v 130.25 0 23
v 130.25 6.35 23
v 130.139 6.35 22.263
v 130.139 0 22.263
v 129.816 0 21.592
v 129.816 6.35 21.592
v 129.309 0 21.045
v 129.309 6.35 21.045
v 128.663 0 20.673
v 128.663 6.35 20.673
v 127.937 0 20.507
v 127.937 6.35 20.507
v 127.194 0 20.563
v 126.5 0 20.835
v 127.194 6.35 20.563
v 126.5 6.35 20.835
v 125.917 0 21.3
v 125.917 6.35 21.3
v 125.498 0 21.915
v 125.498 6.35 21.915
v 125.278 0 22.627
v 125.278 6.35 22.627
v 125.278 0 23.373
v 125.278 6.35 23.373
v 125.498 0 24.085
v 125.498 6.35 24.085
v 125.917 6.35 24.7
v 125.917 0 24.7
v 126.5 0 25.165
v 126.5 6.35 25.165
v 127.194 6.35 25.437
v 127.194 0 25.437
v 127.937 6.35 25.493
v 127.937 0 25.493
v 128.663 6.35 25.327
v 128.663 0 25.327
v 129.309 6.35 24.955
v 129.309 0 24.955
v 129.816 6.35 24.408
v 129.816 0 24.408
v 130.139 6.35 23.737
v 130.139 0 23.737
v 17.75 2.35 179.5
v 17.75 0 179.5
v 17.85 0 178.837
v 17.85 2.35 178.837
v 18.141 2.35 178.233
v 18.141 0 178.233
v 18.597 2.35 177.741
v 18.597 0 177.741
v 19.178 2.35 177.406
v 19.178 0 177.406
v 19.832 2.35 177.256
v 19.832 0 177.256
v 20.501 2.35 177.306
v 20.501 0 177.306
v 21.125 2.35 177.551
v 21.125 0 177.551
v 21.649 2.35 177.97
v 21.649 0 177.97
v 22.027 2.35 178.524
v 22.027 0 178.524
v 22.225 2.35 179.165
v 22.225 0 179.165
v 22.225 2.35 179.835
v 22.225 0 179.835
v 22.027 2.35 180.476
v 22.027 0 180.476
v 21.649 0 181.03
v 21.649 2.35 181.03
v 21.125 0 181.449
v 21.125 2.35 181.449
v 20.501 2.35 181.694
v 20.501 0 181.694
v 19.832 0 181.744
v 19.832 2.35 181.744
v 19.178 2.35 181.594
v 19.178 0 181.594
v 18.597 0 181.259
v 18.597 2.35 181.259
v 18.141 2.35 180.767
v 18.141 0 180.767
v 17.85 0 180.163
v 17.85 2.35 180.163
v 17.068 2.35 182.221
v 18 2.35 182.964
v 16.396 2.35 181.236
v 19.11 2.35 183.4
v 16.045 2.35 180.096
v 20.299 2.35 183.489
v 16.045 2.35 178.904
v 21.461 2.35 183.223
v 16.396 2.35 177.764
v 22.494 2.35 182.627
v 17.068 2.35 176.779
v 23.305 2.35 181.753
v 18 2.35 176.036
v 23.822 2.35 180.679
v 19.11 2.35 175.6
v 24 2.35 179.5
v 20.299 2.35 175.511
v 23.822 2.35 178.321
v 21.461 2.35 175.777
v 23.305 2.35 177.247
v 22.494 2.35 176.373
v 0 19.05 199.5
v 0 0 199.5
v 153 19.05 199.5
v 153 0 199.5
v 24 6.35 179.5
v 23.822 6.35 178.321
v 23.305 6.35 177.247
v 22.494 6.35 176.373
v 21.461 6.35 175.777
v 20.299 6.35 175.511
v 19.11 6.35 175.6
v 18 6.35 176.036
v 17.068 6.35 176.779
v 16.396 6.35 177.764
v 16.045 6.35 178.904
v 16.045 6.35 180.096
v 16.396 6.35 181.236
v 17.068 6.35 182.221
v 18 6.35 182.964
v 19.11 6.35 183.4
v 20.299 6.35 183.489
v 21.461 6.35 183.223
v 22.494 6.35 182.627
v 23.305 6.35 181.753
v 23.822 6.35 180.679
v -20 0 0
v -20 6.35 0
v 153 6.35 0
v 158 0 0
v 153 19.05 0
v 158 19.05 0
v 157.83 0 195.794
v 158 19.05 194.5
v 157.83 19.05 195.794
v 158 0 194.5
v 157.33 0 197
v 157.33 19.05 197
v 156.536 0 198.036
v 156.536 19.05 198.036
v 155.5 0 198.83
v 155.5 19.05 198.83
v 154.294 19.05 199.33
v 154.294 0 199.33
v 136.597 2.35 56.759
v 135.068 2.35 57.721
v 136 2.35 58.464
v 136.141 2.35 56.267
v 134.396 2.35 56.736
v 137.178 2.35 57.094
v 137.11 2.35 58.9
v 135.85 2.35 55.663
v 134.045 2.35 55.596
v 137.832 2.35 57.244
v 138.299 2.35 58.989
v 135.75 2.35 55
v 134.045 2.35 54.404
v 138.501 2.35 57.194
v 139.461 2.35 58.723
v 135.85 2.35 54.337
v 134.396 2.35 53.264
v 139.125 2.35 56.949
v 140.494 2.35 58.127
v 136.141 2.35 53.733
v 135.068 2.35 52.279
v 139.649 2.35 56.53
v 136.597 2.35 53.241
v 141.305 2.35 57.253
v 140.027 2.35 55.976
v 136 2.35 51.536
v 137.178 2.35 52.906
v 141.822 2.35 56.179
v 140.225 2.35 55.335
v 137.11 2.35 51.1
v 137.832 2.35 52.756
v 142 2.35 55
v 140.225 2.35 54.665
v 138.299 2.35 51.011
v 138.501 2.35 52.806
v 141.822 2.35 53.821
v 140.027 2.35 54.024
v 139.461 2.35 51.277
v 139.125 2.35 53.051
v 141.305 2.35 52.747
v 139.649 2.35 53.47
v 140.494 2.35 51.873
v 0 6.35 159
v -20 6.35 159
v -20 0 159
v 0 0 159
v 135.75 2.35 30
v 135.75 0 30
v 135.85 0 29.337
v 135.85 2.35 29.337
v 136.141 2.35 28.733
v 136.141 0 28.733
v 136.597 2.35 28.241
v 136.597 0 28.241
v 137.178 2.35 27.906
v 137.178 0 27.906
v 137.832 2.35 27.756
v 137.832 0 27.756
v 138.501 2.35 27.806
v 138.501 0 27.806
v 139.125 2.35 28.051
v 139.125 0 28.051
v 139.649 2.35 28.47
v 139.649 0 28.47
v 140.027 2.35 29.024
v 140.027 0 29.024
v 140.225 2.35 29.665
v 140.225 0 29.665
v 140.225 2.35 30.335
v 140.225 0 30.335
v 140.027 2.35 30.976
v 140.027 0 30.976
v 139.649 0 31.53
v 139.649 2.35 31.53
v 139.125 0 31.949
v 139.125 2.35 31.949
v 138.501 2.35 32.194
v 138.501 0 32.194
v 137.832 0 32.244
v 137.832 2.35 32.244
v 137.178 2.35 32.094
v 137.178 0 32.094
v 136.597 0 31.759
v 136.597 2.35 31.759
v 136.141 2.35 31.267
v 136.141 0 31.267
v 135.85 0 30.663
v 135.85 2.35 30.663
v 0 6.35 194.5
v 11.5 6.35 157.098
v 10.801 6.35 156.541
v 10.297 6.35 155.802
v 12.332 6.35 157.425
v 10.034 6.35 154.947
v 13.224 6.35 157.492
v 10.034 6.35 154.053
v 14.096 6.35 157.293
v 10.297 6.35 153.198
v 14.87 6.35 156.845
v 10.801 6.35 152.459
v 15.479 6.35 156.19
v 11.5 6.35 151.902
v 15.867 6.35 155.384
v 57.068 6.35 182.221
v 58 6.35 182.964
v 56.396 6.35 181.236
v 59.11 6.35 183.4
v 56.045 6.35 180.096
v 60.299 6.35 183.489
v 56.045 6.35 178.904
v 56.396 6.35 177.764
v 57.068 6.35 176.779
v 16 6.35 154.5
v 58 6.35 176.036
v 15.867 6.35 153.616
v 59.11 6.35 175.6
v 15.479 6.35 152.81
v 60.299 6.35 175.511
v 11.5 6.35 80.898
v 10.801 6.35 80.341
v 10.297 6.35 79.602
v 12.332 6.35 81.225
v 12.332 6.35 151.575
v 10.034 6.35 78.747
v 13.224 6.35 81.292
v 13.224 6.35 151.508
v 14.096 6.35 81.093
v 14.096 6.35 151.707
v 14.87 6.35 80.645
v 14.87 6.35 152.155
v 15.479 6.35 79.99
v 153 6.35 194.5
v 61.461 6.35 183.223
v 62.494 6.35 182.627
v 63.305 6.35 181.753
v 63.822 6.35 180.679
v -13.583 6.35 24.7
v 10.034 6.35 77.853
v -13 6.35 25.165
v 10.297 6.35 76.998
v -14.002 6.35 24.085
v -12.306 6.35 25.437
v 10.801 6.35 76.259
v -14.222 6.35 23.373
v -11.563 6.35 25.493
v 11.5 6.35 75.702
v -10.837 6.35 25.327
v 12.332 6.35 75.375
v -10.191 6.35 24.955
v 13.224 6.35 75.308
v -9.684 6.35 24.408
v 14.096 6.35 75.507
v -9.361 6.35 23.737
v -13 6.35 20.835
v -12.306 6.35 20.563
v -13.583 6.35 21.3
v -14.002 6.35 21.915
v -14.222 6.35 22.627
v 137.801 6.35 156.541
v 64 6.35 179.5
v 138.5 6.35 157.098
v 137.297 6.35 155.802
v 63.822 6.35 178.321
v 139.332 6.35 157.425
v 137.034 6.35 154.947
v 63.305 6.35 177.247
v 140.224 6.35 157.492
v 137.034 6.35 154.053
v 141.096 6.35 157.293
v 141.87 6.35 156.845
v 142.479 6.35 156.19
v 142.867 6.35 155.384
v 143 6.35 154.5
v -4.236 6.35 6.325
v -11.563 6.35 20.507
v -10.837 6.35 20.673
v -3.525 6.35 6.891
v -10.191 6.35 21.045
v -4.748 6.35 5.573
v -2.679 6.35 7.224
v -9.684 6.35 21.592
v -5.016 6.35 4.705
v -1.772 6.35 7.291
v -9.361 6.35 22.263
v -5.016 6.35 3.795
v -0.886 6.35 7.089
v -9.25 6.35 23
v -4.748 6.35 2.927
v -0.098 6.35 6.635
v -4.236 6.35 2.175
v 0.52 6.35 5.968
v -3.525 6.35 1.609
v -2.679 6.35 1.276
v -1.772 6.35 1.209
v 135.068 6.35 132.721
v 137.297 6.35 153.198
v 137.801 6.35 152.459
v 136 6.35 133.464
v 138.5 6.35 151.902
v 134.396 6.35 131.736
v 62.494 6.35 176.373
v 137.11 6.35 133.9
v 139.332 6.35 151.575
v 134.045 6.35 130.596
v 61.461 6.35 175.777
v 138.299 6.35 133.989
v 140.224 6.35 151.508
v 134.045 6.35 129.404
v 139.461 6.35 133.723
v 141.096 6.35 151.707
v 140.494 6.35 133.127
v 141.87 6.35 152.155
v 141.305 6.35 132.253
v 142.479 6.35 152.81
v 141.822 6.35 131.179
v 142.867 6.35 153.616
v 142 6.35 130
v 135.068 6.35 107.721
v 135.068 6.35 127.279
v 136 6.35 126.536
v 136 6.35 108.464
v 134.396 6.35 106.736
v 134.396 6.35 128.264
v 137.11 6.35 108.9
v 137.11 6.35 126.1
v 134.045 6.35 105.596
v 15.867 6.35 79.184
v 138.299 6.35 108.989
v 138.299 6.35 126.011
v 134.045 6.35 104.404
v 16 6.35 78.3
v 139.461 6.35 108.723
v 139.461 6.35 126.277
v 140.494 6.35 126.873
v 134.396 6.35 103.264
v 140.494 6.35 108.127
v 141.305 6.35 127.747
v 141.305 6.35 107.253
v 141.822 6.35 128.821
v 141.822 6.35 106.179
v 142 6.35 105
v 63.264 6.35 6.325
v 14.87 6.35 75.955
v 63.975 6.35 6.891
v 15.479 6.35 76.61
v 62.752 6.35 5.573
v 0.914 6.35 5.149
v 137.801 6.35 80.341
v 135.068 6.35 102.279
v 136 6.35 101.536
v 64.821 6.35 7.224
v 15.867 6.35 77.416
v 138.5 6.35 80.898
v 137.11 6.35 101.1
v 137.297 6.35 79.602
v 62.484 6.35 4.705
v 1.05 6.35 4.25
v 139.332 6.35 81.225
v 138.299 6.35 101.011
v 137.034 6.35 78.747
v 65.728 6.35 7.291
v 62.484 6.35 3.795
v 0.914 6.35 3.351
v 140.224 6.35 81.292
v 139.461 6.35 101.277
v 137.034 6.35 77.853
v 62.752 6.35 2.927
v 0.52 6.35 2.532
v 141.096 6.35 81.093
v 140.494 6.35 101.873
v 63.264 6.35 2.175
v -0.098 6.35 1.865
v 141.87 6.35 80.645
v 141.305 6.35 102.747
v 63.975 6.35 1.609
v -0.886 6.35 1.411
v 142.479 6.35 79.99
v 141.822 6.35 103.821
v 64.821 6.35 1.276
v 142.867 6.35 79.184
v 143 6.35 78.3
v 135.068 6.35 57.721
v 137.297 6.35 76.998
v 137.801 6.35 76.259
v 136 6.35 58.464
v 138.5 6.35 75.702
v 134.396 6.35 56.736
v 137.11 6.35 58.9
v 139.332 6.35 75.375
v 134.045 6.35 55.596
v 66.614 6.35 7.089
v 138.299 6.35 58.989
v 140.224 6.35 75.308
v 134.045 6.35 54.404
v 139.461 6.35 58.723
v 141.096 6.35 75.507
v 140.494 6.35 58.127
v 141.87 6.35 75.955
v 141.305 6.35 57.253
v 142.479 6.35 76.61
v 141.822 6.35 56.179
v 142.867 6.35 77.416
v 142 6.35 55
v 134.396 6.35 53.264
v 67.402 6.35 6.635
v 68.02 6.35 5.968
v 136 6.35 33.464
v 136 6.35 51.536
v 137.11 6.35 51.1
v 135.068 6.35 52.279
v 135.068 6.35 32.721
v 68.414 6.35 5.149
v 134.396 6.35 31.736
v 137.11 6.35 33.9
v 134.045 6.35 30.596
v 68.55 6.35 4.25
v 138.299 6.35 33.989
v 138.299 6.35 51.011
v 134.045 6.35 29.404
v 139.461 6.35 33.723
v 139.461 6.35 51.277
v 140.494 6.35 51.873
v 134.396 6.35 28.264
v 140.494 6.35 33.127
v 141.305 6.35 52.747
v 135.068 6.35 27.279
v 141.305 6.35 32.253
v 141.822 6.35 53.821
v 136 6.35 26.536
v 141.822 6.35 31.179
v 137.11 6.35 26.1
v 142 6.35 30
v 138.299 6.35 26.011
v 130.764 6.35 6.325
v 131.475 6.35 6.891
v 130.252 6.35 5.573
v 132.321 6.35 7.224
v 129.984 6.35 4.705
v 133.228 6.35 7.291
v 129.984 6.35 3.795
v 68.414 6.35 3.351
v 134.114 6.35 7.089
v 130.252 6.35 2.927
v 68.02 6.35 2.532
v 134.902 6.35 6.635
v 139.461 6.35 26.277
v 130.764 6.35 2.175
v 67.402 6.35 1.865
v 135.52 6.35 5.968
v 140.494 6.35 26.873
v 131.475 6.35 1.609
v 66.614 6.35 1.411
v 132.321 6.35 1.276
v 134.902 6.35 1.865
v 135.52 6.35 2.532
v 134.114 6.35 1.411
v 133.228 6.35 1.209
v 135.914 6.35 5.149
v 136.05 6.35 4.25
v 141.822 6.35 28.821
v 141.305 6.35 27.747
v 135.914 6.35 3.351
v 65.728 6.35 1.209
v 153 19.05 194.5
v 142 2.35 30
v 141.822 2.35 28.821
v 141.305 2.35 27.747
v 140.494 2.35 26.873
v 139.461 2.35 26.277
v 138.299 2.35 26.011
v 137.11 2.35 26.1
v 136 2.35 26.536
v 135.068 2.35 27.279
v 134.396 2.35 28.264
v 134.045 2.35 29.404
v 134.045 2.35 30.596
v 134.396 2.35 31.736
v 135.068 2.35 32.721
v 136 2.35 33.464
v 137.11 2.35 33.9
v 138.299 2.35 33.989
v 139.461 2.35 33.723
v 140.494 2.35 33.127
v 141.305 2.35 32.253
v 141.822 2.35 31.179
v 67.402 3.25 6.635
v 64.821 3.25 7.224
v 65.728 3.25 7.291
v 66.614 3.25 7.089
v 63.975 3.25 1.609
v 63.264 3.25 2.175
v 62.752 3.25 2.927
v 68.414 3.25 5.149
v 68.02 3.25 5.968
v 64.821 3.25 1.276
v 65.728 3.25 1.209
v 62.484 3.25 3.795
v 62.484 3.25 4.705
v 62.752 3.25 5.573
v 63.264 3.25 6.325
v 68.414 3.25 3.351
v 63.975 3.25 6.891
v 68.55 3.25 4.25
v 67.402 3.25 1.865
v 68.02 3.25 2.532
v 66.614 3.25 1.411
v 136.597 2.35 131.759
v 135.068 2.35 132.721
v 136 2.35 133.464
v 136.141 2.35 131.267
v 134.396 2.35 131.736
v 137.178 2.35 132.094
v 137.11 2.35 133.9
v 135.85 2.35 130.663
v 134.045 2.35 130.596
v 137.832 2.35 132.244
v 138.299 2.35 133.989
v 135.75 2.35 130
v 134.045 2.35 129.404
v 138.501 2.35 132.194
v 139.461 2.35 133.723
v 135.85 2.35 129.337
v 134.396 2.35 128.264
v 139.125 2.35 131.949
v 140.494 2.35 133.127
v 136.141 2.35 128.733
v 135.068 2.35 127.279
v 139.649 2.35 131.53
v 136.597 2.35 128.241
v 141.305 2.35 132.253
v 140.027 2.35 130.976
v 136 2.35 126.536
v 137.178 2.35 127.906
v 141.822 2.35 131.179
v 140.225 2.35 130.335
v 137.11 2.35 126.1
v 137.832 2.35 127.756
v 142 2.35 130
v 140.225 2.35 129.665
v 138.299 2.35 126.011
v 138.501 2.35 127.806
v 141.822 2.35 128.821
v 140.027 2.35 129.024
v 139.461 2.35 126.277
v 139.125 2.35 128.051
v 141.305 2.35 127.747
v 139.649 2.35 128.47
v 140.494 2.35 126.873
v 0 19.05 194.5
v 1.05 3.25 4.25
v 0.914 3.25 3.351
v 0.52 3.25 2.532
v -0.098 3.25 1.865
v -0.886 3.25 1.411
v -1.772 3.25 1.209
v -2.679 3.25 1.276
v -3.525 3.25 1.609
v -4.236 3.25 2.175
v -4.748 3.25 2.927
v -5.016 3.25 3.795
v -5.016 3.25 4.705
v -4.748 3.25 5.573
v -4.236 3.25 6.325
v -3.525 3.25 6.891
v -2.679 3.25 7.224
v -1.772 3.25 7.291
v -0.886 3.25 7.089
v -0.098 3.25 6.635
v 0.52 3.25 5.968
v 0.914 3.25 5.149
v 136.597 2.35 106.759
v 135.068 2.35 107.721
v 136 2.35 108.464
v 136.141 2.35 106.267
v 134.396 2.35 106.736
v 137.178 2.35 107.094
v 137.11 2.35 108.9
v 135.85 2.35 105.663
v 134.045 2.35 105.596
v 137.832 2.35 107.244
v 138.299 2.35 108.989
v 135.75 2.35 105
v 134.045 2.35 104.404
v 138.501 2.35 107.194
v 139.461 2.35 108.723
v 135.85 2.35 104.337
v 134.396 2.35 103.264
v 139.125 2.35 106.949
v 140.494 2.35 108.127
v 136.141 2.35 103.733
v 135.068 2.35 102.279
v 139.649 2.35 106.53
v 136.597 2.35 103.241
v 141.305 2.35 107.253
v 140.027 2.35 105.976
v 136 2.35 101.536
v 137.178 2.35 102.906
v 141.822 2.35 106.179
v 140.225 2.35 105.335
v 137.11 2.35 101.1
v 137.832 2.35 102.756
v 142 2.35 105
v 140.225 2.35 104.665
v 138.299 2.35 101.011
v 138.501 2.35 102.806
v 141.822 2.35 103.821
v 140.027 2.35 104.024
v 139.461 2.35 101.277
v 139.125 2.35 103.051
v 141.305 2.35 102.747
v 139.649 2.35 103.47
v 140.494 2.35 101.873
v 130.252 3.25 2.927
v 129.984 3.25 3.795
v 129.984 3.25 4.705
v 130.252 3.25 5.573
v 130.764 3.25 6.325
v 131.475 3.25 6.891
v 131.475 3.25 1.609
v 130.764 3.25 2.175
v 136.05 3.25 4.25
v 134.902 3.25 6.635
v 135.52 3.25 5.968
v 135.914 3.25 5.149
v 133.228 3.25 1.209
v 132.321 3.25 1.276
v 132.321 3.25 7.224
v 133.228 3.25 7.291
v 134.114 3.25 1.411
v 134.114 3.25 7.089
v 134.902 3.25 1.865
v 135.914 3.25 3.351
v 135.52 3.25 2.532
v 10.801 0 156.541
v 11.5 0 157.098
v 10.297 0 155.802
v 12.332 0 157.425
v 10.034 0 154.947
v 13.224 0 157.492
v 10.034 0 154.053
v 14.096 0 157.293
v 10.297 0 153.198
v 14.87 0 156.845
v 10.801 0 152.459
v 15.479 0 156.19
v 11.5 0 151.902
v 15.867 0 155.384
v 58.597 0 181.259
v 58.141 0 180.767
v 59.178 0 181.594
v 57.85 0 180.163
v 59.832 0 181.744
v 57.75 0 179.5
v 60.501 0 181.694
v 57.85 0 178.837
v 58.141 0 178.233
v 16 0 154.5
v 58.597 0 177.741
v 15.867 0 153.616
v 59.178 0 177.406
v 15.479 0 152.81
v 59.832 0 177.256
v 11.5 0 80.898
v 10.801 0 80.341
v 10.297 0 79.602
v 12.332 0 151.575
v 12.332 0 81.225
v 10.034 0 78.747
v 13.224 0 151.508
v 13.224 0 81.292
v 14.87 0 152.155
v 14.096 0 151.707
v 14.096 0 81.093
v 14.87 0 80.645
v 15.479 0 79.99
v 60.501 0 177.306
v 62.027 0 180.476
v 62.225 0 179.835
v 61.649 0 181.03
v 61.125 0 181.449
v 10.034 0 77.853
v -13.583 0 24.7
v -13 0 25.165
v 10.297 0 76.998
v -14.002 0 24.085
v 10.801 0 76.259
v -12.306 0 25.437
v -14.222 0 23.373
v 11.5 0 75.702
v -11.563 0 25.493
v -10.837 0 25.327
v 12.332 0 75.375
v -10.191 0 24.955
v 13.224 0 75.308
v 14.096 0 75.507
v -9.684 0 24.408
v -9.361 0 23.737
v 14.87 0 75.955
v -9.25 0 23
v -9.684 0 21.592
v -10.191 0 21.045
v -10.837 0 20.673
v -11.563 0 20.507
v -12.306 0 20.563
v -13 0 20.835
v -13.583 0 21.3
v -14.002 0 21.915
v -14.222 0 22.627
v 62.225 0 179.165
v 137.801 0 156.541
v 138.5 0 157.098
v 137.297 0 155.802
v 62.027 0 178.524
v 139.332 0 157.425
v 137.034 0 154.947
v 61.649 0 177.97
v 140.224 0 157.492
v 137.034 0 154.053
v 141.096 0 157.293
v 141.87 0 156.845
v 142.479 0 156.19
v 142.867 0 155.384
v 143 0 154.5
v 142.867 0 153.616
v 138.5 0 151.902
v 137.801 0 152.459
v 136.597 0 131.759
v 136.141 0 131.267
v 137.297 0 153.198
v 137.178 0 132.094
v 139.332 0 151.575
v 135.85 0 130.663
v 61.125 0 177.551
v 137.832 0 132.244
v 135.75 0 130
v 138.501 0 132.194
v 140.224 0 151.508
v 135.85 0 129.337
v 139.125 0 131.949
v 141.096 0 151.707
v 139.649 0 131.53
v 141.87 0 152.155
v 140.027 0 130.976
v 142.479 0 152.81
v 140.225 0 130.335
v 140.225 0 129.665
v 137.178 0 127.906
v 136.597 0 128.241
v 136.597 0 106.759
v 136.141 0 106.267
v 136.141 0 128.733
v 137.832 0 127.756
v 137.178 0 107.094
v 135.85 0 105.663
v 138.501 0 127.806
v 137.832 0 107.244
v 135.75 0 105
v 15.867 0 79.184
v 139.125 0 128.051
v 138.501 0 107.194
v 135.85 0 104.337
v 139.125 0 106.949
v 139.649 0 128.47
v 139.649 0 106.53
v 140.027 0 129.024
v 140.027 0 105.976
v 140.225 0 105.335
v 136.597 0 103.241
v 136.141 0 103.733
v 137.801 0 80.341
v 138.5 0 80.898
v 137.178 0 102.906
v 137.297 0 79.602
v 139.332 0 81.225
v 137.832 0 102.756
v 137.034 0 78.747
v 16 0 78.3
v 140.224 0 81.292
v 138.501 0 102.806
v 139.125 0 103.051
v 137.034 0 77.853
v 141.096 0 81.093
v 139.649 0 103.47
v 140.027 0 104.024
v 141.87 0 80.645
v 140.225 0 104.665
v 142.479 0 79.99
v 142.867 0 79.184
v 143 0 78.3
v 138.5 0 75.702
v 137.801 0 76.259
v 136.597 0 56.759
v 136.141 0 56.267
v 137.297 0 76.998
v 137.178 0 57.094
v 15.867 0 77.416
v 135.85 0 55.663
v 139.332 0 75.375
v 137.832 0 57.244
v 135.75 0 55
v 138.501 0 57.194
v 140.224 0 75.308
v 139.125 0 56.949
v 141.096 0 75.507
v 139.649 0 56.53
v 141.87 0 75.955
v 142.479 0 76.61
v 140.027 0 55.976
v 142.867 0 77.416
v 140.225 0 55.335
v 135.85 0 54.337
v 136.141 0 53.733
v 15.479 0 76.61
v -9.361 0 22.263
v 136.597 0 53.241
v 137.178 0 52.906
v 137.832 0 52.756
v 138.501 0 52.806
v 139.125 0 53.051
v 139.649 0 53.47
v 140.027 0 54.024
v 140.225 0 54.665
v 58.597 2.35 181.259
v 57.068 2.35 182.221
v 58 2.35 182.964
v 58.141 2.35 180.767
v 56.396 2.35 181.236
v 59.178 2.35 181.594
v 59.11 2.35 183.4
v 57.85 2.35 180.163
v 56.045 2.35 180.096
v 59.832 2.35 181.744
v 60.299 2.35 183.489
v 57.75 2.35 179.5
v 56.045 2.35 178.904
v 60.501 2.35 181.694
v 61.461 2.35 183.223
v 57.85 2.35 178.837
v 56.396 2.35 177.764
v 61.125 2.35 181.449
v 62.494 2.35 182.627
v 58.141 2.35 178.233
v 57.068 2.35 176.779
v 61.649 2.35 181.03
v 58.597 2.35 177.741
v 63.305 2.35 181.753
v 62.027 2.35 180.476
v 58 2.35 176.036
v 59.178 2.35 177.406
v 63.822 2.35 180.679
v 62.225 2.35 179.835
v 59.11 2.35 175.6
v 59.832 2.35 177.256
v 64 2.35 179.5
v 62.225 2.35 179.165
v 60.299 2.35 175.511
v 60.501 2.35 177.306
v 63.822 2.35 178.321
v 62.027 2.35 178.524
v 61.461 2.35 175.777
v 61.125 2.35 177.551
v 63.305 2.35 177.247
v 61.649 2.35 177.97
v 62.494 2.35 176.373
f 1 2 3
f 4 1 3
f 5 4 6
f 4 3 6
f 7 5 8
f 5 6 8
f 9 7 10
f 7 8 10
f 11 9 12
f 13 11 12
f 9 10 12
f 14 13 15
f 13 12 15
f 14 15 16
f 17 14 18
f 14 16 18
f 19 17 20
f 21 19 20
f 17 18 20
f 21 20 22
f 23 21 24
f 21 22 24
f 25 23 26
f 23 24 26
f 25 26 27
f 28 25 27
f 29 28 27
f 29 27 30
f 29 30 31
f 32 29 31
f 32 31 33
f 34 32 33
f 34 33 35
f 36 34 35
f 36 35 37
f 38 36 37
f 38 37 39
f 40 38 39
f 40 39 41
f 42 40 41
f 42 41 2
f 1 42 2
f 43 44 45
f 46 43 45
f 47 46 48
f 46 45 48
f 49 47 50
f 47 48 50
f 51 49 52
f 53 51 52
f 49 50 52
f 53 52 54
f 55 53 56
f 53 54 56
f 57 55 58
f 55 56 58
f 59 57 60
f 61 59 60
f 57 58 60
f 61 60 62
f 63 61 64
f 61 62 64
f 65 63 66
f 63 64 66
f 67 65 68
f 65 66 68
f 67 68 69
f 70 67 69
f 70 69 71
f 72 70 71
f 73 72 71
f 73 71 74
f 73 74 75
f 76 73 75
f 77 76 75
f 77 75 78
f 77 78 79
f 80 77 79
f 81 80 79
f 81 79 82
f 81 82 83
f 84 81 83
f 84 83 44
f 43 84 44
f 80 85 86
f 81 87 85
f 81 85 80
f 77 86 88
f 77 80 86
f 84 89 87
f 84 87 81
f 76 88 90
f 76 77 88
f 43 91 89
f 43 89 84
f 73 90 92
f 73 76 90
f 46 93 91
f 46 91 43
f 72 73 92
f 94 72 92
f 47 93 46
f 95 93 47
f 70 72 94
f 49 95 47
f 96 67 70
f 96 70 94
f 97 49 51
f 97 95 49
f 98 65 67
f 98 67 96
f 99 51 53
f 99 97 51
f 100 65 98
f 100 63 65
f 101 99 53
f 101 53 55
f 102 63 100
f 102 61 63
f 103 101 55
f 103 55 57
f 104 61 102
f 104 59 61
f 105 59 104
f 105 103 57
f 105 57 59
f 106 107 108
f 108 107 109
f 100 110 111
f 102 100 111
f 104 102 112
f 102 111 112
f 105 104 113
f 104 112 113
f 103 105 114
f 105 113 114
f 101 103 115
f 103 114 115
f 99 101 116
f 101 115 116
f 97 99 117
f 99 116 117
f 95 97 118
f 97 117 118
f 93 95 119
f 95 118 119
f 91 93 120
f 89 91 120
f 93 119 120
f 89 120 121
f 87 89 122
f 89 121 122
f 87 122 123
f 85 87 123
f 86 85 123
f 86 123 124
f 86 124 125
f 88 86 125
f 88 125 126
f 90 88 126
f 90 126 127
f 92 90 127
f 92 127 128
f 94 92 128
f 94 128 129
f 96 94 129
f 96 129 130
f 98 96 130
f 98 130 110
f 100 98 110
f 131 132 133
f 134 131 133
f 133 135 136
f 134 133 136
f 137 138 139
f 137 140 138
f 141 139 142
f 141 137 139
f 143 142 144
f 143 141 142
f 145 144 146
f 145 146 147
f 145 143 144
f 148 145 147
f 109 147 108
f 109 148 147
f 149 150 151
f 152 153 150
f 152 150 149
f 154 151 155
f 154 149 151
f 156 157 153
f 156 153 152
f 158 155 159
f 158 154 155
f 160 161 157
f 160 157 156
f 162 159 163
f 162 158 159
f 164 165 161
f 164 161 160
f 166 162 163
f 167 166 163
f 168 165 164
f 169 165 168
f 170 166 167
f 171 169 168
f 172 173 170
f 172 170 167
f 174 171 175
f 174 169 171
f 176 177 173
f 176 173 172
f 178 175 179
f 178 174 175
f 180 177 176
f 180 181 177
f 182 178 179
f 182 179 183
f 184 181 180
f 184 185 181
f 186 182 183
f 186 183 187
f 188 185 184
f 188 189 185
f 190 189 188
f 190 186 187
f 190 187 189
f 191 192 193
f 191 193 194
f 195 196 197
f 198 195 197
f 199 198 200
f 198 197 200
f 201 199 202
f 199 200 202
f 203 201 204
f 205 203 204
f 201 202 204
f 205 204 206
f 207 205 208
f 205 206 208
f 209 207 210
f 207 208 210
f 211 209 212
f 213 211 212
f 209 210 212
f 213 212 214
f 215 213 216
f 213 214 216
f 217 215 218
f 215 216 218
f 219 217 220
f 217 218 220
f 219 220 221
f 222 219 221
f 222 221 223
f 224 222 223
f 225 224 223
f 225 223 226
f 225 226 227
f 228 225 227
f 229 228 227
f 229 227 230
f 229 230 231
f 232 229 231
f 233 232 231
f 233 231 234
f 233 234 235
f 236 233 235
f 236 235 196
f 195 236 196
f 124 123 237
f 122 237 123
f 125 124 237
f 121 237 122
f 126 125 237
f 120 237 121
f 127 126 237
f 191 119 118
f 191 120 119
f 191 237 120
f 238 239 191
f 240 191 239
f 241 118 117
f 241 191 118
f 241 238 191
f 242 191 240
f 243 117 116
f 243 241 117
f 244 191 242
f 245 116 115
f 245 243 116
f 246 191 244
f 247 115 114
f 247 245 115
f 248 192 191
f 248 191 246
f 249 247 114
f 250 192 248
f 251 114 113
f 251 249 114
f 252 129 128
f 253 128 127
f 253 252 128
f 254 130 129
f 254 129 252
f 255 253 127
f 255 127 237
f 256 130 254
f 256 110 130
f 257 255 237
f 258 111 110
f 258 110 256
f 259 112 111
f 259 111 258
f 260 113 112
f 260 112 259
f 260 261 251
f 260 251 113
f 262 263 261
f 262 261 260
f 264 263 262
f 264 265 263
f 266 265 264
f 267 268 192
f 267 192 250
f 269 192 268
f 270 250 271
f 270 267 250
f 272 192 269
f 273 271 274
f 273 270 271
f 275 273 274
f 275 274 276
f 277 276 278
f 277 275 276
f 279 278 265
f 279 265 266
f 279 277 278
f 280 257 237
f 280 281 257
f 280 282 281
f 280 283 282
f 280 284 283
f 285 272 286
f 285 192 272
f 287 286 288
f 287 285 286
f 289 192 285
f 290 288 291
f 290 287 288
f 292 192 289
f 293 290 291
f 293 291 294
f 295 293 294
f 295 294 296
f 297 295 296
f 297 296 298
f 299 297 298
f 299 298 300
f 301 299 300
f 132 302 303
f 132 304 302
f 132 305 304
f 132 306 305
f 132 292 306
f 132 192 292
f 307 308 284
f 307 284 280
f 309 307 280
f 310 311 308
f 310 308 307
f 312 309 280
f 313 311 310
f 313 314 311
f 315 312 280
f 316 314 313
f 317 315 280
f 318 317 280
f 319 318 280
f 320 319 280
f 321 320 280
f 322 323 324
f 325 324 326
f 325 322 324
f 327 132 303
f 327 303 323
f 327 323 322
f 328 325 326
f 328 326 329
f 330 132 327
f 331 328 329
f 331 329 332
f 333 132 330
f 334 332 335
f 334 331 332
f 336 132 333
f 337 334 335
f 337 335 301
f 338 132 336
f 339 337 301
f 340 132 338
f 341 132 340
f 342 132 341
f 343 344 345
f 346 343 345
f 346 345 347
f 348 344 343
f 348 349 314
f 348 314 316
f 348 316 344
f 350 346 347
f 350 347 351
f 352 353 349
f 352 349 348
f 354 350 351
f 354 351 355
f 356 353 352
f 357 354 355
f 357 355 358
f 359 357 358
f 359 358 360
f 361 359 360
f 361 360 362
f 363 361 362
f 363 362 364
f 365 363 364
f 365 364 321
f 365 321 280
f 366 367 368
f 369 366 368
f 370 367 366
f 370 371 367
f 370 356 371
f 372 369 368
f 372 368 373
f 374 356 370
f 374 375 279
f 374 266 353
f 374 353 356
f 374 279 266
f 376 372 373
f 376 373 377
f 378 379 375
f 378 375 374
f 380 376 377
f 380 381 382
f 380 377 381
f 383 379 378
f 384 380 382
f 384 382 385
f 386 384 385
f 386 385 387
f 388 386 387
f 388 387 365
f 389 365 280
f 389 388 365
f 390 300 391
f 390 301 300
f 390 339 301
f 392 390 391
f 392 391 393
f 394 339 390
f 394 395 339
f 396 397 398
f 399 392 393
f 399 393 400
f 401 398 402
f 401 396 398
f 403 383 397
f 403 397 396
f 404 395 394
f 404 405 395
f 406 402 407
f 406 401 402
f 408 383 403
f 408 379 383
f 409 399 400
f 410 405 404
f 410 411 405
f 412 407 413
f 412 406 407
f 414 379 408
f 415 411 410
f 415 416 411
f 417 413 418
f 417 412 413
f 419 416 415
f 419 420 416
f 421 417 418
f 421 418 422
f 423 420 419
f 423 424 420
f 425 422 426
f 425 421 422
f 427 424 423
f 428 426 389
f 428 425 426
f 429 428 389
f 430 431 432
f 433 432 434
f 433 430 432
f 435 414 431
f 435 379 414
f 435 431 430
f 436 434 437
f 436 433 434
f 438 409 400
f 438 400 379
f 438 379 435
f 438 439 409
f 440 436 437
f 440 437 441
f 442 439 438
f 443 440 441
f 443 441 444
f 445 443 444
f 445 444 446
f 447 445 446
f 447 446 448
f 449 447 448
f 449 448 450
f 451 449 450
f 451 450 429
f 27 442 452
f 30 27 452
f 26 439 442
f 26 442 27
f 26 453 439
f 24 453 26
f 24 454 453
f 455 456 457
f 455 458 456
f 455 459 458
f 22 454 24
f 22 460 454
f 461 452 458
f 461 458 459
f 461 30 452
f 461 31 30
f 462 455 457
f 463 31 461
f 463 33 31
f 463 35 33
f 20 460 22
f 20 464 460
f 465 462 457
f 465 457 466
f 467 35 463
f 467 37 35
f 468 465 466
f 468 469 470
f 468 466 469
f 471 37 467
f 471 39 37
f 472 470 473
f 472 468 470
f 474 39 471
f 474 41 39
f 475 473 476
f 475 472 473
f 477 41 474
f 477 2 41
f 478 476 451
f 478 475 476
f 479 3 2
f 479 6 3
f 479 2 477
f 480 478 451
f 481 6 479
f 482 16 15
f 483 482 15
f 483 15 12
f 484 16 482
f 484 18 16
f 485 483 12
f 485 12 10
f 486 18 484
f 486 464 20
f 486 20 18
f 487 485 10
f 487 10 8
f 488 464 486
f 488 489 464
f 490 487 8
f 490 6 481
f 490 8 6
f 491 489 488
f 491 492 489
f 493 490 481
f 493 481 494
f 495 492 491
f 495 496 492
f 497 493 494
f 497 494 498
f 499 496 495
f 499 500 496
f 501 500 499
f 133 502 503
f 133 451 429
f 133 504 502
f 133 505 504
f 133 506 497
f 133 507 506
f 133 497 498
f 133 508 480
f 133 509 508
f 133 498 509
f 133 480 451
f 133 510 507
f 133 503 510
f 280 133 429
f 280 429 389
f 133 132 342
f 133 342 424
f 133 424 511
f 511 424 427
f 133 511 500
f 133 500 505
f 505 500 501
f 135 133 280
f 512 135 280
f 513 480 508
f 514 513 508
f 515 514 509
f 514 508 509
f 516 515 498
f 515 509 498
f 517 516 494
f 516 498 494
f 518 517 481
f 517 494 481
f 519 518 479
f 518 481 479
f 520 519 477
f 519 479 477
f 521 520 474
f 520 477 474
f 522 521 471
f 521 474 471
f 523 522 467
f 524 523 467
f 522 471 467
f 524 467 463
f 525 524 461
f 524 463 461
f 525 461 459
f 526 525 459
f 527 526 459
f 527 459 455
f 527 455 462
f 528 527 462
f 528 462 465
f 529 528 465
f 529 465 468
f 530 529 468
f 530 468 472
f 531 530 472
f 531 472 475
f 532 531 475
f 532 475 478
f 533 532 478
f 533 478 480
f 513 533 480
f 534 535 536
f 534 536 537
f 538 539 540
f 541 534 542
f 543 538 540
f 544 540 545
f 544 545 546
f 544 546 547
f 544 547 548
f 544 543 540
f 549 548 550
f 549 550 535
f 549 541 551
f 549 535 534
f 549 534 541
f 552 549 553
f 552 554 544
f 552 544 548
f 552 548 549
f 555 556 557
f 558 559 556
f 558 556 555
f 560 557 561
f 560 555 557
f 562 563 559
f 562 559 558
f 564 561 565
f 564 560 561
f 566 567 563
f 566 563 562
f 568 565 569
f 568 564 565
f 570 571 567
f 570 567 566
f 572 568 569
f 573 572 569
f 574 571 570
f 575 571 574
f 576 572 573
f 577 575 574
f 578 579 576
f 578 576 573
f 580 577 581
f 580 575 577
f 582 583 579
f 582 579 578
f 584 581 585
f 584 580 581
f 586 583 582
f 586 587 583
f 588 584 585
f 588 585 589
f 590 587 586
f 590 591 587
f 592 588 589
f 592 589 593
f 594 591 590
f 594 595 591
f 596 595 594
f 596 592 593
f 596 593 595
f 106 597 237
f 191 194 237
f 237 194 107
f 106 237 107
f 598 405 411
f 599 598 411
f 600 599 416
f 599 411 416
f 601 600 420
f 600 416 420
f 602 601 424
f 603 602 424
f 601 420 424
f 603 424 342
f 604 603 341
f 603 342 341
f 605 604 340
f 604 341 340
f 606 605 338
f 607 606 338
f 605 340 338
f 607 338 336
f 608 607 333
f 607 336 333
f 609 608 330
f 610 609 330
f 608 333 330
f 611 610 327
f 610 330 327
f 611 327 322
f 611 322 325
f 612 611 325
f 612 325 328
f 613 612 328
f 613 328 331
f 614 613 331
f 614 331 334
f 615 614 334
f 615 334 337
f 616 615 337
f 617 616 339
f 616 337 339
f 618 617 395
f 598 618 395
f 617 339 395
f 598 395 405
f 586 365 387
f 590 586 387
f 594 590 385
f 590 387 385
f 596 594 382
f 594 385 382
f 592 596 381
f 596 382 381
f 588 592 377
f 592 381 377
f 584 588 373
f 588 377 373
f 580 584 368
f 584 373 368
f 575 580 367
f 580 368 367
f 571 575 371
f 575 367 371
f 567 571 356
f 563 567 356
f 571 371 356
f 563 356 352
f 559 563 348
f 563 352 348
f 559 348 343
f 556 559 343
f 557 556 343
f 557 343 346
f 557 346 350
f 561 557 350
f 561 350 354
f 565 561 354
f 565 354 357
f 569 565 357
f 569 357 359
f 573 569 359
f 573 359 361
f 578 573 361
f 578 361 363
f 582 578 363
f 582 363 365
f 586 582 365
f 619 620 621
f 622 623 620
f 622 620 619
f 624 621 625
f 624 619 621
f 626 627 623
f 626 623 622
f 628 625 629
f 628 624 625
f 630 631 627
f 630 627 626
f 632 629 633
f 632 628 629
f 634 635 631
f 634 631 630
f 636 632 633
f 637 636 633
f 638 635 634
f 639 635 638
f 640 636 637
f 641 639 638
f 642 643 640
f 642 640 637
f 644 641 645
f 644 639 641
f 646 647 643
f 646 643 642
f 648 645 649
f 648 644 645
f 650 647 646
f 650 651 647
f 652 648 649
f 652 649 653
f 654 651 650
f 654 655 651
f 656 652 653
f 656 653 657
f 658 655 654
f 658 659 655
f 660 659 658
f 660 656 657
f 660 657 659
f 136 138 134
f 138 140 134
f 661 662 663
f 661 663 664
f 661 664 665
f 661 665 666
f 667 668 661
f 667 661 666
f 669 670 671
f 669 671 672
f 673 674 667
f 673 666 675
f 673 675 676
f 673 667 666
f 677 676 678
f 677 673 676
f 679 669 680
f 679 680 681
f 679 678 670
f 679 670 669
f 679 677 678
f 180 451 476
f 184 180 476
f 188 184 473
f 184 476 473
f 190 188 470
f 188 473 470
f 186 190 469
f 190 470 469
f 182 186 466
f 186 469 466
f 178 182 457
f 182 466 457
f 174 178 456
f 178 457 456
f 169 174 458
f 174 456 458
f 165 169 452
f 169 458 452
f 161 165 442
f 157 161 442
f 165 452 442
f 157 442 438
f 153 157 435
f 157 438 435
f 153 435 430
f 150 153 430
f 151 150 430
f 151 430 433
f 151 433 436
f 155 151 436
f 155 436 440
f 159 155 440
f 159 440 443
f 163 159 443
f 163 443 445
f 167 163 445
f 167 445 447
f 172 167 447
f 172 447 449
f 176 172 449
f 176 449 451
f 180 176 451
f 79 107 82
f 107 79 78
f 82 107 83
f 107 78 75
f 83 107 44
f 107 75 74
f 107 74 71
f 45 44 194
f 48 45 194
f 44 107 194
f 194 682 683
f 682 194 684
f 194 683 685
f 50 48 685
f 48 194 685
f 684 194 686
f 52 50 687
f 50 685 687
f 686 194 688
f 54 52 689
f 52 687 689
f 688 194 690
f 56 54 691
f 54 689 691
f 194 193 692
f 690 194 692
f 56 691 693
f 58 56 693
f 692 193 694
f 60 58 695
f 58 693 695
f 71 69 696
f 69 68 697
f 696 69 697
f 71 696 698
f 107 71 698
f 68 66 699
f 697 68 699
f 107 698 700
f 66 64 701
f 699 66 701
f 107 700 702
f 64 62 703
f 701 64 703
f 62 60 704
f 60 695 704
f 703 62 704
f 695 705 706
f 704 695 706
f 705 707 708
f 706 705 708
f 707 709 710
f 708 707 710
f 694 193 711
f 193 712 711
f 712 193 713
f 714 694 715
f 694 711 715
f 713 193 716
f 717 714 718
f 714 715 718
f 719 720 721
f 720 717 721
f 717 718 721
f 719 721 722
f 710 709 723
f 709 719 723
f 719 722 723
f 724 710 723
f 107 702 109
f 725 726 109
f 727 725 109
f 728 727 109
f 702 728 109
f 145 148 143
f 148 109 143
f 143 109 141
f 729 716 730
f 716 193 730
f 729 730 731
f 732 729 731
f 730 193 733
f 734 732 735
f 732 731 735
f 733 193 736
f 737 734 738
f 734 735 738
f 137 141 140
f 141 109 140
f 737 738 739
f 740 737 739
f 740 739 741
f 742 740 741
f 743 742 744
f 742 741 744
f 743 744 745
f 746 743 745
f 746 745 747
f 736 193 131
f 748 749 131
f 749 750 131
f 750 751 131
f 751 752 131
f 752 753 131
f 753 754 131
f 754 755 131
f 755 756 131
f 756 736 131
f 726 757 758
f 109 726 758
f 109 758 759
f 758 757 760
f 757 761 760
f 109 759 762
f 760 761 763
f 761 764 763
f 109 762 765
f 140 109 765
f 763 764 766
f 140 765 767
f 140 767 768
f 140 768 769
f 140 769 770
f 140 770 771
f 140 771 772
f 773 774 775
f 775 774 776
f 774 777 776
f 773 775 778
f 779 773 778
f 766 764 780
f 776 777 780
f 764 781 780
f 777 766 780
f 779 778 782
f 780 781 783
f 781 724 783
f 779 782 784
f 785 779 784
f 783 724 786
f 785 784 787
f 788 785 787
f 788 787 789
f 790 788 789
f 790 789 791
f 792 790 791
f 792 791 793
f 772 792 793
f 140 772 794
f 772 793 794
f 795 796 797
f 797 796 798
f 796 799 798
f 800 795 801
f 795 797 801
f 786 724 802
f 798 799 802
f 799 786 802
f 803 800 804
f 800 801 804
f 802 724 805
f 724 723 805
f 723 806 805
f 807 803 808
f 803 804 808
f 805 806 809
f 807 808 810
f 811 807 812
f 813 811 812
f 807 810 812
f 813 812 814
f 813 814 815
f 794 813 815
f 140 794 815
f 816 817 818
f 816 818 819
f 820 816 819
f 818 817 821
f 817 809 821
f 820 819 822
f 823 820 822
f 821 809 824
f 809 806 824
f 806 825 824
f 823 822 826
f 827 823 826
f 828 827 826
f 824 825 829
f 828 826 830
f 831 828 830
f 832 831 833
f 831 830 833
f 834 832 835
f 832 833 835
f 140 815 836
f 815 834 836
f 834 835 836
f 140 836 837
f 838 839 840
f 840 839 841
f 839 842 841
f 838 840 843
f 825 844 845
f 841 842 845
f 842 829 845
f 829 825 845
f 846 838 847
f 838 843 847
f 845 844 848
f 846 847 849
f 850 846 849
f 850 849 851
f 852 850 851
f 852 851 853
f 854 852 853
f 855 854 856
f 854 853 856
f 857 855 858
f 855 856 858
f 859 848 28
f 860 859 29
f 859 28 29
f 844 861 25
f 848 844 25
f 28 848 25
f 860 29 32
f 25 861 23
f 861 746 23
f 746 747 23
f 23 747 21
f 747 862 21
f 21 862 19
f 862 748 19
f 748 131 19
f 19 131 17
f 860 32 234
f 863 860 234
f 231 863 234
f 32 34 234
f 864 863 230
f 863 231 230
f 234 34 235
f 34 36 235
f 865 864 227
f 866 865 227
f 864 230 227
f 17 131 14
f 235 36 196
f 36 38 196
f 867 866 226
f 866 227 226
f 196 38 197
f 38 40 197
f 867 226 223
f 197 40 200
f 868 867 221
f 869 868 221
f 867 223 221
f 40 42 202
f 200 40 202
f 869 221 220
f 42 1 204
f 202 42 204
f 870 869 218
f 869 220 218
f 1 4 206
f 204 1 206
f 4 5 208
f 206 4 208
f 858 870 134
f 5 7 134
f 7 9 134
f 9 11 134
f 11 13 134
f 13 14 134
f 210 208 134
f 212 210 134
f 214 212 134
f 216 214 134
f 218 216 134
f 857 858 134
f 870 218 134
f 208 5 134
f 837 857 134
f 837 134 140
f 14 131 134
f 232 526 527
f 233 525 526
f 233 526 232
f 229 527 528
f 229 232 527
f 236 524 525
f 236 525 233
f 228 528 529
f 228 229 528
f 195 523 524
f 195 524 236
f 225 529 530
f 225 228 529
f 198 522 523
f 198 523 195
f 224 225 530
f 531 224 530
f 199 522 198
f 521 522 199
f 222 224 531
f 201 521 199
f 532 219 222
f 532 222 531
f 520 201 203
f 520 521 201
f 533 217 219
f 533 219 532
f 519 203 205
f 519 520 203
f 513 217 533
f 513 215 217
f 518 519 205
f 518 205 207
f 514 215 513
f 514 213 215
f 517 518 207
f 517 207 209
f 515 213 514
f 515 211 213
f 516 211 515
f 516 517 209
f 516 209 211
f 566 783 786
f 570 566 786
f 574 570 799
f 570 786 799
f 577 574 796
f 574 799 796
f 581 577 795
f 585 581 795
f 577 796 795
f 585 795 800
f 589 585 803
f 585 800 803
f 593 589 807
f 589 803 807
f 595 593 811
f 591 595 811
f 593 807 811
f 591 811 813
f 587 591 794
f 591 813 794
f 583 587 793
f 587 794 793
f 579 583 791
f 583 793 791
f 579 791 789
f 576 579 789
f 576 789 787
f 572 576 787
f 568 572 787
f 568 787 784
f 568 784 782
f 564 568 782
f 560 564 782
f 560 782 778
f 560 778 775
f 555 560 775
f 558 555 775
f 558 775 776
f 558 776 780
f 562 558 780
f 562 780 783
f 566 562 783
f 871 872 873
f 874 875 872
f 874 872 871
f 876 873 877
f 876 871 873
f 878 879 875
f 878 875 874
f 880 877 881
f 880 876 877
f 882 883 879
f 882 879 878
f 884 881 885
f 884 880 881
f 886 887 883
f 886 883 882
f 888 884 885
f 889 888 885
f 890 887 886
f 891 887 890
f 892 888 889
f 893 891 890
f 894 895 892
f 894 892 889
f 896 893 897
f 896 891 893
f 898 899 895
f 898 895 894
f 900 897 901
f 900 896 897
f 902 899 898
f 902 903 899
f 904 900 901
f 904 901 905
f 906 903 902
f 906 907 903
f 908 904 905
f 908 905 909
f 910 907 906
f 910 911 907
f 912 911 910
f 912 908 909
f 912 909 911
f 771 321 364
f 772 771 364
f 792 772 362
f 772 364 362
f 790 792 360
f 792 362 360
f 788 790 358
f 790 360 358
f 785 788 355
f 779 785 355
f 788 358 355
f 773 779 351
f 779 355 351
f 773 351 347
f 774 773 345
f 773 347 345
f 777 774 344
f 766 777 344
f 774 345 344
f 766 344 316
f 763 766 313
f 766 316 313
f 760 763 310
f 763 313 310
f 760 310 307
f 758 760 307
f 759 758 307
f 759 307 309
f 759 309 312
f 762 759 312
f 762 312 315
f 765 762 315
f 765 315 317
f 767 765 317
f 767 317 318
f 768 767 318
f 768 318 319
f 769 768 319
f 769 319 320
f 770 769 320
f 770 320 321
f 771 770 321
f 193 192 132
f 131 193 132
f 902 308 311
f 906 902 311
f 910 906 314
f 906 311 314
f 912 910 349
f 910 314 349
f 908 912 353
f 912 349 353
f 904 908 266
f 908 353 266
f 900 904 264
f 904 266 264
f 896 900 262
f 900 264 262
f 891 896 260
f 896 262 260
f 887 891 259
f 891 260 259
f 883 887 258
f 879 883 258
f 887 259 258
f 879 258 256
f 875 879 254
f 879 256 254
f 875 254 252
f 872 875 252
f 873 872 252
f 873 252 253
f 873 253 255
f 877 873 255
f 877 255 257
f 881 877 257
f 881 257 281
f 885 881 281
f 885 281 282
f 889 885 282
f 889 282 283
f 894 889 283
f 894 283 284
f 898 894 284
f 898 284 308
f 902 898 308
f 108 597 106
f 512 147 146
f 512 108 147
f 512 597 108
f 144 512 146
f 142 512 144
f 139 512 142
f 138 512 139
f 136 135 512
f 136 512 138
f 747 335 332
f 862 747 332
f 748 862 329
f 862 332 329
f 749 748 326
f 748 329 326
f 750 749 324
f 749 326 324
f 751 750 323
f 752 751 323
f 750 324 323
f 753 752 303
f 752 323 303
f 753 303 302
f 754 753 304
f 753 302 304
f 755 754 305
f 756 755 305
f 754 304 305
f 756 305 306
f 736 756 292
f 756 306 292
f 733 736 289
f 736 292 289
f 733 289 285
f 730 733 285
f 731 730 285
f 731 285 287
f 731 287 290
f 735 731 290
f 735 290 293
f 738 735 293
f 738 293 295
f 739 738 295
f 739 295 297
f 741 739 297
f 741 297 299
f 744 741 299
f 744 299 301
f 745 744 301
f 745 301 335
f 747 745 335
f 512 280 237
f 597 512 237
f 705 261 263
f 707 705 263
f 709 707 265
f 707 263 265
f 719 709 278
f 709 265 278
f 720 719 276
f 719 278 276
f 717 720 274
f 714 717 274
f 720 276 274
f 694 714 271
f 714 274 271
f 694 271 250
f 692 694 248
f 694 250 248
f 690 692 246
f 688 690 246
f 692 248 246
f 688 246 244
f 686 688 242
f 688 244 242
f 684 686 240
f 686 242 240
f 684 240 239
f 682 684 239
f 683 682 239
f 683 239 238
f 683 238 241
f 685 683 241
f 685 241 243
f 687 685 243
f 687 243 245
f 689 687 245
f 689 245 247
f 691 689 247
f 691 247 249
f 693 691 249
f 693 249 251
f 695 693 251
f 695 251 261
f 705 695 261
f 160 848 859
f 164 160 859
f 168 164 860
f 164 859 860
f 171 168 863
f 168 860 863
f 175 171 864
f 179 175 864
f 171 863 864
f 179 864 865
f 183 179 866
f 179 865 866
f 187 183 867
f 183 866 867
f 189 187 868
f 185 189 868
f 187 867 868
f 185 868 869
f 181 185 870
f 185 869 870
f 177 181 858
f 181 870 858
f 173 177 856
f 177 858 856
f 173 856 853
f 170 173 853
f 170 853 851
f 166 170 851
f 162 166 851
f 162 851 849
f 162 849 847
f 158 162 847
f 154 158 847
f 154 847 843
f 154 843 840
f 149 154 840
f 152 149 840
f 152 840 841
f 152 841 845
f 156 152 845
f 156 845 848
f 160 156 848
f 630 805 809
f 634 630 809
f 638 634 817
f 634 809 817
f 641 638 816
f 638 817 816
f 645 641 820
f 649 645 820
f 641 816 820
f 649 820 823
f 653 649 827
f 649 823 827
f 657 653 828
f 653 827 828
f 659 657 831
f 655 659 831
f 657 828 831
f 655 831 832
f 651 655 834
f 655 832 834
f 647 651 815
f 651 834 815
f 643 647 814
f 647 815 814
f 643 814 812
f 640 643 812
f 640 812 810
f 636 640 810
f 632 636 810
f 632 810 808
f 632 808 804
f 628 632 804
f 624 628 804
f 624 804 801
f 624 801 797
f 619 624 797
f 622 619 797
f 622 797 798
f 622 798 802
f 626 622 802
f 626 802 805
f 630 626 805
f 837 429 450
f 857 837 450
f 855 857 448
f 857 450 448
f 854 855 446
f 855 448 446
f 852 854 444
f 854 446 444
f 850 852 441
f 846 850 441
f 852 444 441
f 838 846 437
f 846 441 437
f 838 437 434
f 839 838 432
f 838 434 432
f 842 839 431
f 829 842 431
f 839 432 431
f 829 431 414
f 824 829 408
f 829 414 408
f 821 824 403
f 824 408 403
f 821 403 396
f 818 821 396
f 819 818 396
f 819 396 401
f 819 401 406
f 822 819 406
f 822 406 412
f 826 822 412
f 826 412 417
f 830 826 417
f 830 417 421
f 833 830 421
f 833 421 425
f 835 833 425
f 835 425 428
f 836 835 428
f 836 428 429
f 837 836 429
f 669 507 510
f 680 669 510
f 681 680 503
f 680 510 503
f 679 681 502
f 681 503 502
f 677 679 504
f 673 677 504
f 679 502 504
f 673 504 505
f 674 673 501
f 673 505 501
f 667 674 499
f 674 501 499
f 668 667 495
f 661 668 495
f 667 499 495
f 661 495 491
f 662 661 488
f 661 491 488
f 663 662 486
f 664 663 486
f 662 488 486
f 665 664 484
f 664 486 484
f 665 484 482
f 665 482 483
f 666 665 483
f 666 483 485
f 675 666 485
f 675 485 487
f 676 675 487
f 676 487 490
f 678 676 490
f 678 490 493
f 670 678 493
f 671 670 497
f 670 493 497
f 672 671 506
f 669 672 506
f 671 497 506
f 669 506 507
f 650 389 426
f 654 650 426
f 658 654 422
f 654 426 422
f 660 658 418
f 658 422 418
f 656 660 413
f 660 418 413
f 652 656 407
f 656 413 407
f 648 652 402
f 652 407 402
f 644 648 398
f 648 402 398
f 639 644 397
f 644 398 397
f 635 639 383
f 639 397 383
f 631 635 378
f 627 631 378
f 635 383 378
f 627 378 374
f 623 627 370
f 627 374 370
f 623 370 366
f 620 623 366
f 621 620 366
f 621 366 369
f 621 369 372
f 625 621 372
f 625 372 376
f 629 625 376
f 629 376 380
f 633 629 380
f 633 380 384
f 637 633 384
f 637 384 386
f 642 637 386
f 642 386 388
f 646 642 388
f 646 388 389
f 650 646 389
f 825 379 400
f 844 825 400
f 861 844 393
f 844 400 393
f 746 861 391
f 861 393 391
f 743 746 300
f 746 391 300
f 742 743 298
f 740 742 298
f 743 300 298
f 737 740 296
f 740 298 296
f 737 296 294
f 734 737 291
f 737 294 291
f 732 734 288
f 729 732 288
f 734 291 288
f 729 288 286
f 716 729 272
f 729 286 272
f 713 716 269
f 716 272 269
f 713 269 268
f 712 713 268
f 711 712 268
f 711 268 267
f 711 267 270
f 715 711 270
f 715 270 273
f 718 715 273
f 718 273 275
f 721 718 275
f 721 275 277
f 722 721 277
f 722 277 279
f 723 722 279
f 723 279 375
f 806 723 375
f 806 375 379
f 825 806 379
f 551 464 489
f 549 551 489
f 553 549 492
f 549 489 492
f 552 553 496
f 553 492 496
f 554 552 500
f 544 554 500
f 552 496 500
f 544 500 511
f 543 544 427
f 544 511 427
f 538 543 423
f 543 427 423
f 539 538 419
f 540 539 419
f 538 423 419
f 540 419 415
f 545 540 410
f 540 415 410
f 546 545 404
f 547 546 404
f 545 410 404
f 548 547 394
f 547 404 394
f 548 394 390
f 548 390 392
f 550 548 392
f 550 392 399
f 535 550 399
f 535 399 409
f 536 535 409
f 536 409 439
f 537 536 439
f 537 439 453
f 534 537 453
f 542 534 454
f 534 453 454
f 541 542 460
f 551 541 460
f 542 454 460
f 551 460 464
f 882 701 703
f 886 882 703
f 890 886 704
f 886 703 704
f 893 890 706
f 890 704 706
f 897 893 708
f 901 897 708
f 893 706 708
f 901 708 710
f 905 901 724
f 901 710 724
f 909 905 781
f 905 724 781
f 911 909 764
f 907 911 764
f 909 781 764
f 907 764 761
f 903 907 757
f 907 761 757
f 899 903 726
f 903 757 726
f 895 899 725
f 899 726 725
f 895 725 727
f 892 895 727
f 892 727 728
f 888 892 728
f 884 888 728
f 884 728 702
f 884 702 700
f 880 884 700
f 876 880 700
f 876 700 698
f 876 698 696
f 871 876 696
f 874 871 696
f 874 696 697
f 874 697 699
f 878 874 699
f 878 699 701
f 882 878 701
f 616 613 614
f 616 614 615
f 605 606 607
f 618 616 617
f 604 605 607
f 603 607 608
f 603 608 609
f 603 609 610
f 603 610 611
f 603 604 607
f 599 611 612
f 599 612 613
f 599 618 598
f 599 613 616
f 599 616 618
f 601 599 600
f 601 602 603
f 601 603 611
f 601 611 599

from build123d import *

# Parameters (mm, degrees)
SKETCH1_W                      = 158
SKETCH1_H                      = 199.5
BOSS_EXTRUDE1_DEPTH            = 6.35
BOSS_EXTRUDE2_DEPTH            = 12.7
CBORE_FOR_M4_SHCS1_D           = 4.5
CBORE_FOR_M4_SHCS1_DEPTH       = 6.35
CBORE_FOR_M4_SHCS1_CBORE_D     = 8
CBORE_FOR_M4_SHCS1_CBORE_DEPTH = 4
FILLET4_R                      = 5
SKETCH17_W                     = 20
SKETCH17_H                     = 159
BOSS_EXTRUDE3_DEPTH            = 6.35
SKETCH18_R                     = 3
ENCLOSURE_DEPTH                = 7.35
SKETCH19_R                     = 2.5
CUT_EXTRUDE4_DEPTH             = 7.35
SKETCH20_R                     = 3.05
CUT_EXTRUDE5_DEPTH             = 3.1


with BuildPart() as part:
    # Sketch1 → Boss-Extrude1 (new body)
    with BuildSketch(Plane(origin=(0, 0, 0), x_dir=(1, 0, 0), z_dir=(0, 1, 0))):
        with Locations((79, -99.75)):
            Rectangle(SKETCH1_W, SKETCH1_H)
    extrude(amount=BOSS_EXTRUDE1_DEPTH)

    # Sketch3 → Boss-Extrude2 (add)
    with BuildSketch(Plane(origin=(0, 6.35, 0), x_dir=(1, 0, 0), z_dir=(0, 1, 0))):
        Polygon((158, -199.5), (158, 0), (153, 0), (153, -194.5), (0, -194.5), (0, -199.5), align=None)
    extrude(amount=BOSS_EXTRUDE2_DEPTH)

    # CBORE for M4 SHCS1
    with Locations(Plane(origin=(0, 6.35, 0), x_dir=(1, 0, 0), z_dir=(0, 1, 0))):
        with Locations((138, -55), (20, -179.5), (60, -179.5), (138, -130), (138, -105), (138, -30)):
            CounterBoreHole(CBORE_FOR_M4_SHCS1_D / 2, CBORE_FOR_M4_SHCS1_CBORE_D / 2, CBORE_FOR_M4_SHCS1_CBORE_DEPTH, depth=CBORE_FOR_M4_SHCS1_DEPTH)

    # Fillet4
    fillet4_edges = [part.edges().sort_by_distance(p)[0] for p in [
        (158, 9.525, 199.5),
    ]]
    fillet(fillet4_edges, radius=FILLET4_R)

    # Sketch17 → Boss-Extrude3 (add)
    with BuildSketch(Plane(origin=(0, 6.35, 0), x_dir=(1, 0, 0), z_dir=(0, 1, 0))):
        with Locations((-10, -79.5)):
            Rectangle(SKETCH17_W, SKETCH17_H)
    extrude(amount=-BOSS_EXTRUDE3_DEPTH)

    # Sketch18 → Enclosure (cut, through all)
    with BuildSketch(Plane(origin=(0, 6.35, 0), x_dir=(1, 0, 0), z_dir=(0, 1, 0))):
        with Locations((13, -154.5)):
            Circle(SKETCH18_R)
        with Locations((13, -78.3)):
            Circle(SKETCH18_R)
        with Locations((140, -78.3)):
            Circle(SKETCH18_R)
        with Locations((140, -154.5)):
            Circle(SKETCH18_R)
    extrude(amount=-ENCLOSURE_DEPTH, mode=Mode.SUBTRACT)

    # Sketch19 → Cut-Extrude4 (cut, through all)
    with BuildSketch(Plane(origin=(0, 6.35, 0), x_dir=(1, 0, 0), z_dir=(0, 1, 0))):
        with Locations((-11.75, -23)):
            Circle(SKETCH19_R)
        with Locations((127.75, -23)):
            Circle(SKETCH19_R)
    extrude(amount=-CUT_EXTRUDE4_DEPTH, mode=Mode.SUBTRACT)

    # Sketch20 → Cut-Extrude5 (cut)
    with BuildSketch(Plane(origin=(0, 6.35, 0), x_dir=(1, 0, 0), z_dir=(0, 1, 0))):
        with Locations((133, -4.25)):
            Circle(SKETCH20_R)
        with Locations((65.5, -4.25)):
            Circle(SKETCH20_R)
        with Locations((-2, -4.25)):
            Circle(SKETCH20_R)
    extrude(amount=-CUT_EXTRUDE5_DEPTH, mode=Mode.SUBTRACT)


solid = part.part
